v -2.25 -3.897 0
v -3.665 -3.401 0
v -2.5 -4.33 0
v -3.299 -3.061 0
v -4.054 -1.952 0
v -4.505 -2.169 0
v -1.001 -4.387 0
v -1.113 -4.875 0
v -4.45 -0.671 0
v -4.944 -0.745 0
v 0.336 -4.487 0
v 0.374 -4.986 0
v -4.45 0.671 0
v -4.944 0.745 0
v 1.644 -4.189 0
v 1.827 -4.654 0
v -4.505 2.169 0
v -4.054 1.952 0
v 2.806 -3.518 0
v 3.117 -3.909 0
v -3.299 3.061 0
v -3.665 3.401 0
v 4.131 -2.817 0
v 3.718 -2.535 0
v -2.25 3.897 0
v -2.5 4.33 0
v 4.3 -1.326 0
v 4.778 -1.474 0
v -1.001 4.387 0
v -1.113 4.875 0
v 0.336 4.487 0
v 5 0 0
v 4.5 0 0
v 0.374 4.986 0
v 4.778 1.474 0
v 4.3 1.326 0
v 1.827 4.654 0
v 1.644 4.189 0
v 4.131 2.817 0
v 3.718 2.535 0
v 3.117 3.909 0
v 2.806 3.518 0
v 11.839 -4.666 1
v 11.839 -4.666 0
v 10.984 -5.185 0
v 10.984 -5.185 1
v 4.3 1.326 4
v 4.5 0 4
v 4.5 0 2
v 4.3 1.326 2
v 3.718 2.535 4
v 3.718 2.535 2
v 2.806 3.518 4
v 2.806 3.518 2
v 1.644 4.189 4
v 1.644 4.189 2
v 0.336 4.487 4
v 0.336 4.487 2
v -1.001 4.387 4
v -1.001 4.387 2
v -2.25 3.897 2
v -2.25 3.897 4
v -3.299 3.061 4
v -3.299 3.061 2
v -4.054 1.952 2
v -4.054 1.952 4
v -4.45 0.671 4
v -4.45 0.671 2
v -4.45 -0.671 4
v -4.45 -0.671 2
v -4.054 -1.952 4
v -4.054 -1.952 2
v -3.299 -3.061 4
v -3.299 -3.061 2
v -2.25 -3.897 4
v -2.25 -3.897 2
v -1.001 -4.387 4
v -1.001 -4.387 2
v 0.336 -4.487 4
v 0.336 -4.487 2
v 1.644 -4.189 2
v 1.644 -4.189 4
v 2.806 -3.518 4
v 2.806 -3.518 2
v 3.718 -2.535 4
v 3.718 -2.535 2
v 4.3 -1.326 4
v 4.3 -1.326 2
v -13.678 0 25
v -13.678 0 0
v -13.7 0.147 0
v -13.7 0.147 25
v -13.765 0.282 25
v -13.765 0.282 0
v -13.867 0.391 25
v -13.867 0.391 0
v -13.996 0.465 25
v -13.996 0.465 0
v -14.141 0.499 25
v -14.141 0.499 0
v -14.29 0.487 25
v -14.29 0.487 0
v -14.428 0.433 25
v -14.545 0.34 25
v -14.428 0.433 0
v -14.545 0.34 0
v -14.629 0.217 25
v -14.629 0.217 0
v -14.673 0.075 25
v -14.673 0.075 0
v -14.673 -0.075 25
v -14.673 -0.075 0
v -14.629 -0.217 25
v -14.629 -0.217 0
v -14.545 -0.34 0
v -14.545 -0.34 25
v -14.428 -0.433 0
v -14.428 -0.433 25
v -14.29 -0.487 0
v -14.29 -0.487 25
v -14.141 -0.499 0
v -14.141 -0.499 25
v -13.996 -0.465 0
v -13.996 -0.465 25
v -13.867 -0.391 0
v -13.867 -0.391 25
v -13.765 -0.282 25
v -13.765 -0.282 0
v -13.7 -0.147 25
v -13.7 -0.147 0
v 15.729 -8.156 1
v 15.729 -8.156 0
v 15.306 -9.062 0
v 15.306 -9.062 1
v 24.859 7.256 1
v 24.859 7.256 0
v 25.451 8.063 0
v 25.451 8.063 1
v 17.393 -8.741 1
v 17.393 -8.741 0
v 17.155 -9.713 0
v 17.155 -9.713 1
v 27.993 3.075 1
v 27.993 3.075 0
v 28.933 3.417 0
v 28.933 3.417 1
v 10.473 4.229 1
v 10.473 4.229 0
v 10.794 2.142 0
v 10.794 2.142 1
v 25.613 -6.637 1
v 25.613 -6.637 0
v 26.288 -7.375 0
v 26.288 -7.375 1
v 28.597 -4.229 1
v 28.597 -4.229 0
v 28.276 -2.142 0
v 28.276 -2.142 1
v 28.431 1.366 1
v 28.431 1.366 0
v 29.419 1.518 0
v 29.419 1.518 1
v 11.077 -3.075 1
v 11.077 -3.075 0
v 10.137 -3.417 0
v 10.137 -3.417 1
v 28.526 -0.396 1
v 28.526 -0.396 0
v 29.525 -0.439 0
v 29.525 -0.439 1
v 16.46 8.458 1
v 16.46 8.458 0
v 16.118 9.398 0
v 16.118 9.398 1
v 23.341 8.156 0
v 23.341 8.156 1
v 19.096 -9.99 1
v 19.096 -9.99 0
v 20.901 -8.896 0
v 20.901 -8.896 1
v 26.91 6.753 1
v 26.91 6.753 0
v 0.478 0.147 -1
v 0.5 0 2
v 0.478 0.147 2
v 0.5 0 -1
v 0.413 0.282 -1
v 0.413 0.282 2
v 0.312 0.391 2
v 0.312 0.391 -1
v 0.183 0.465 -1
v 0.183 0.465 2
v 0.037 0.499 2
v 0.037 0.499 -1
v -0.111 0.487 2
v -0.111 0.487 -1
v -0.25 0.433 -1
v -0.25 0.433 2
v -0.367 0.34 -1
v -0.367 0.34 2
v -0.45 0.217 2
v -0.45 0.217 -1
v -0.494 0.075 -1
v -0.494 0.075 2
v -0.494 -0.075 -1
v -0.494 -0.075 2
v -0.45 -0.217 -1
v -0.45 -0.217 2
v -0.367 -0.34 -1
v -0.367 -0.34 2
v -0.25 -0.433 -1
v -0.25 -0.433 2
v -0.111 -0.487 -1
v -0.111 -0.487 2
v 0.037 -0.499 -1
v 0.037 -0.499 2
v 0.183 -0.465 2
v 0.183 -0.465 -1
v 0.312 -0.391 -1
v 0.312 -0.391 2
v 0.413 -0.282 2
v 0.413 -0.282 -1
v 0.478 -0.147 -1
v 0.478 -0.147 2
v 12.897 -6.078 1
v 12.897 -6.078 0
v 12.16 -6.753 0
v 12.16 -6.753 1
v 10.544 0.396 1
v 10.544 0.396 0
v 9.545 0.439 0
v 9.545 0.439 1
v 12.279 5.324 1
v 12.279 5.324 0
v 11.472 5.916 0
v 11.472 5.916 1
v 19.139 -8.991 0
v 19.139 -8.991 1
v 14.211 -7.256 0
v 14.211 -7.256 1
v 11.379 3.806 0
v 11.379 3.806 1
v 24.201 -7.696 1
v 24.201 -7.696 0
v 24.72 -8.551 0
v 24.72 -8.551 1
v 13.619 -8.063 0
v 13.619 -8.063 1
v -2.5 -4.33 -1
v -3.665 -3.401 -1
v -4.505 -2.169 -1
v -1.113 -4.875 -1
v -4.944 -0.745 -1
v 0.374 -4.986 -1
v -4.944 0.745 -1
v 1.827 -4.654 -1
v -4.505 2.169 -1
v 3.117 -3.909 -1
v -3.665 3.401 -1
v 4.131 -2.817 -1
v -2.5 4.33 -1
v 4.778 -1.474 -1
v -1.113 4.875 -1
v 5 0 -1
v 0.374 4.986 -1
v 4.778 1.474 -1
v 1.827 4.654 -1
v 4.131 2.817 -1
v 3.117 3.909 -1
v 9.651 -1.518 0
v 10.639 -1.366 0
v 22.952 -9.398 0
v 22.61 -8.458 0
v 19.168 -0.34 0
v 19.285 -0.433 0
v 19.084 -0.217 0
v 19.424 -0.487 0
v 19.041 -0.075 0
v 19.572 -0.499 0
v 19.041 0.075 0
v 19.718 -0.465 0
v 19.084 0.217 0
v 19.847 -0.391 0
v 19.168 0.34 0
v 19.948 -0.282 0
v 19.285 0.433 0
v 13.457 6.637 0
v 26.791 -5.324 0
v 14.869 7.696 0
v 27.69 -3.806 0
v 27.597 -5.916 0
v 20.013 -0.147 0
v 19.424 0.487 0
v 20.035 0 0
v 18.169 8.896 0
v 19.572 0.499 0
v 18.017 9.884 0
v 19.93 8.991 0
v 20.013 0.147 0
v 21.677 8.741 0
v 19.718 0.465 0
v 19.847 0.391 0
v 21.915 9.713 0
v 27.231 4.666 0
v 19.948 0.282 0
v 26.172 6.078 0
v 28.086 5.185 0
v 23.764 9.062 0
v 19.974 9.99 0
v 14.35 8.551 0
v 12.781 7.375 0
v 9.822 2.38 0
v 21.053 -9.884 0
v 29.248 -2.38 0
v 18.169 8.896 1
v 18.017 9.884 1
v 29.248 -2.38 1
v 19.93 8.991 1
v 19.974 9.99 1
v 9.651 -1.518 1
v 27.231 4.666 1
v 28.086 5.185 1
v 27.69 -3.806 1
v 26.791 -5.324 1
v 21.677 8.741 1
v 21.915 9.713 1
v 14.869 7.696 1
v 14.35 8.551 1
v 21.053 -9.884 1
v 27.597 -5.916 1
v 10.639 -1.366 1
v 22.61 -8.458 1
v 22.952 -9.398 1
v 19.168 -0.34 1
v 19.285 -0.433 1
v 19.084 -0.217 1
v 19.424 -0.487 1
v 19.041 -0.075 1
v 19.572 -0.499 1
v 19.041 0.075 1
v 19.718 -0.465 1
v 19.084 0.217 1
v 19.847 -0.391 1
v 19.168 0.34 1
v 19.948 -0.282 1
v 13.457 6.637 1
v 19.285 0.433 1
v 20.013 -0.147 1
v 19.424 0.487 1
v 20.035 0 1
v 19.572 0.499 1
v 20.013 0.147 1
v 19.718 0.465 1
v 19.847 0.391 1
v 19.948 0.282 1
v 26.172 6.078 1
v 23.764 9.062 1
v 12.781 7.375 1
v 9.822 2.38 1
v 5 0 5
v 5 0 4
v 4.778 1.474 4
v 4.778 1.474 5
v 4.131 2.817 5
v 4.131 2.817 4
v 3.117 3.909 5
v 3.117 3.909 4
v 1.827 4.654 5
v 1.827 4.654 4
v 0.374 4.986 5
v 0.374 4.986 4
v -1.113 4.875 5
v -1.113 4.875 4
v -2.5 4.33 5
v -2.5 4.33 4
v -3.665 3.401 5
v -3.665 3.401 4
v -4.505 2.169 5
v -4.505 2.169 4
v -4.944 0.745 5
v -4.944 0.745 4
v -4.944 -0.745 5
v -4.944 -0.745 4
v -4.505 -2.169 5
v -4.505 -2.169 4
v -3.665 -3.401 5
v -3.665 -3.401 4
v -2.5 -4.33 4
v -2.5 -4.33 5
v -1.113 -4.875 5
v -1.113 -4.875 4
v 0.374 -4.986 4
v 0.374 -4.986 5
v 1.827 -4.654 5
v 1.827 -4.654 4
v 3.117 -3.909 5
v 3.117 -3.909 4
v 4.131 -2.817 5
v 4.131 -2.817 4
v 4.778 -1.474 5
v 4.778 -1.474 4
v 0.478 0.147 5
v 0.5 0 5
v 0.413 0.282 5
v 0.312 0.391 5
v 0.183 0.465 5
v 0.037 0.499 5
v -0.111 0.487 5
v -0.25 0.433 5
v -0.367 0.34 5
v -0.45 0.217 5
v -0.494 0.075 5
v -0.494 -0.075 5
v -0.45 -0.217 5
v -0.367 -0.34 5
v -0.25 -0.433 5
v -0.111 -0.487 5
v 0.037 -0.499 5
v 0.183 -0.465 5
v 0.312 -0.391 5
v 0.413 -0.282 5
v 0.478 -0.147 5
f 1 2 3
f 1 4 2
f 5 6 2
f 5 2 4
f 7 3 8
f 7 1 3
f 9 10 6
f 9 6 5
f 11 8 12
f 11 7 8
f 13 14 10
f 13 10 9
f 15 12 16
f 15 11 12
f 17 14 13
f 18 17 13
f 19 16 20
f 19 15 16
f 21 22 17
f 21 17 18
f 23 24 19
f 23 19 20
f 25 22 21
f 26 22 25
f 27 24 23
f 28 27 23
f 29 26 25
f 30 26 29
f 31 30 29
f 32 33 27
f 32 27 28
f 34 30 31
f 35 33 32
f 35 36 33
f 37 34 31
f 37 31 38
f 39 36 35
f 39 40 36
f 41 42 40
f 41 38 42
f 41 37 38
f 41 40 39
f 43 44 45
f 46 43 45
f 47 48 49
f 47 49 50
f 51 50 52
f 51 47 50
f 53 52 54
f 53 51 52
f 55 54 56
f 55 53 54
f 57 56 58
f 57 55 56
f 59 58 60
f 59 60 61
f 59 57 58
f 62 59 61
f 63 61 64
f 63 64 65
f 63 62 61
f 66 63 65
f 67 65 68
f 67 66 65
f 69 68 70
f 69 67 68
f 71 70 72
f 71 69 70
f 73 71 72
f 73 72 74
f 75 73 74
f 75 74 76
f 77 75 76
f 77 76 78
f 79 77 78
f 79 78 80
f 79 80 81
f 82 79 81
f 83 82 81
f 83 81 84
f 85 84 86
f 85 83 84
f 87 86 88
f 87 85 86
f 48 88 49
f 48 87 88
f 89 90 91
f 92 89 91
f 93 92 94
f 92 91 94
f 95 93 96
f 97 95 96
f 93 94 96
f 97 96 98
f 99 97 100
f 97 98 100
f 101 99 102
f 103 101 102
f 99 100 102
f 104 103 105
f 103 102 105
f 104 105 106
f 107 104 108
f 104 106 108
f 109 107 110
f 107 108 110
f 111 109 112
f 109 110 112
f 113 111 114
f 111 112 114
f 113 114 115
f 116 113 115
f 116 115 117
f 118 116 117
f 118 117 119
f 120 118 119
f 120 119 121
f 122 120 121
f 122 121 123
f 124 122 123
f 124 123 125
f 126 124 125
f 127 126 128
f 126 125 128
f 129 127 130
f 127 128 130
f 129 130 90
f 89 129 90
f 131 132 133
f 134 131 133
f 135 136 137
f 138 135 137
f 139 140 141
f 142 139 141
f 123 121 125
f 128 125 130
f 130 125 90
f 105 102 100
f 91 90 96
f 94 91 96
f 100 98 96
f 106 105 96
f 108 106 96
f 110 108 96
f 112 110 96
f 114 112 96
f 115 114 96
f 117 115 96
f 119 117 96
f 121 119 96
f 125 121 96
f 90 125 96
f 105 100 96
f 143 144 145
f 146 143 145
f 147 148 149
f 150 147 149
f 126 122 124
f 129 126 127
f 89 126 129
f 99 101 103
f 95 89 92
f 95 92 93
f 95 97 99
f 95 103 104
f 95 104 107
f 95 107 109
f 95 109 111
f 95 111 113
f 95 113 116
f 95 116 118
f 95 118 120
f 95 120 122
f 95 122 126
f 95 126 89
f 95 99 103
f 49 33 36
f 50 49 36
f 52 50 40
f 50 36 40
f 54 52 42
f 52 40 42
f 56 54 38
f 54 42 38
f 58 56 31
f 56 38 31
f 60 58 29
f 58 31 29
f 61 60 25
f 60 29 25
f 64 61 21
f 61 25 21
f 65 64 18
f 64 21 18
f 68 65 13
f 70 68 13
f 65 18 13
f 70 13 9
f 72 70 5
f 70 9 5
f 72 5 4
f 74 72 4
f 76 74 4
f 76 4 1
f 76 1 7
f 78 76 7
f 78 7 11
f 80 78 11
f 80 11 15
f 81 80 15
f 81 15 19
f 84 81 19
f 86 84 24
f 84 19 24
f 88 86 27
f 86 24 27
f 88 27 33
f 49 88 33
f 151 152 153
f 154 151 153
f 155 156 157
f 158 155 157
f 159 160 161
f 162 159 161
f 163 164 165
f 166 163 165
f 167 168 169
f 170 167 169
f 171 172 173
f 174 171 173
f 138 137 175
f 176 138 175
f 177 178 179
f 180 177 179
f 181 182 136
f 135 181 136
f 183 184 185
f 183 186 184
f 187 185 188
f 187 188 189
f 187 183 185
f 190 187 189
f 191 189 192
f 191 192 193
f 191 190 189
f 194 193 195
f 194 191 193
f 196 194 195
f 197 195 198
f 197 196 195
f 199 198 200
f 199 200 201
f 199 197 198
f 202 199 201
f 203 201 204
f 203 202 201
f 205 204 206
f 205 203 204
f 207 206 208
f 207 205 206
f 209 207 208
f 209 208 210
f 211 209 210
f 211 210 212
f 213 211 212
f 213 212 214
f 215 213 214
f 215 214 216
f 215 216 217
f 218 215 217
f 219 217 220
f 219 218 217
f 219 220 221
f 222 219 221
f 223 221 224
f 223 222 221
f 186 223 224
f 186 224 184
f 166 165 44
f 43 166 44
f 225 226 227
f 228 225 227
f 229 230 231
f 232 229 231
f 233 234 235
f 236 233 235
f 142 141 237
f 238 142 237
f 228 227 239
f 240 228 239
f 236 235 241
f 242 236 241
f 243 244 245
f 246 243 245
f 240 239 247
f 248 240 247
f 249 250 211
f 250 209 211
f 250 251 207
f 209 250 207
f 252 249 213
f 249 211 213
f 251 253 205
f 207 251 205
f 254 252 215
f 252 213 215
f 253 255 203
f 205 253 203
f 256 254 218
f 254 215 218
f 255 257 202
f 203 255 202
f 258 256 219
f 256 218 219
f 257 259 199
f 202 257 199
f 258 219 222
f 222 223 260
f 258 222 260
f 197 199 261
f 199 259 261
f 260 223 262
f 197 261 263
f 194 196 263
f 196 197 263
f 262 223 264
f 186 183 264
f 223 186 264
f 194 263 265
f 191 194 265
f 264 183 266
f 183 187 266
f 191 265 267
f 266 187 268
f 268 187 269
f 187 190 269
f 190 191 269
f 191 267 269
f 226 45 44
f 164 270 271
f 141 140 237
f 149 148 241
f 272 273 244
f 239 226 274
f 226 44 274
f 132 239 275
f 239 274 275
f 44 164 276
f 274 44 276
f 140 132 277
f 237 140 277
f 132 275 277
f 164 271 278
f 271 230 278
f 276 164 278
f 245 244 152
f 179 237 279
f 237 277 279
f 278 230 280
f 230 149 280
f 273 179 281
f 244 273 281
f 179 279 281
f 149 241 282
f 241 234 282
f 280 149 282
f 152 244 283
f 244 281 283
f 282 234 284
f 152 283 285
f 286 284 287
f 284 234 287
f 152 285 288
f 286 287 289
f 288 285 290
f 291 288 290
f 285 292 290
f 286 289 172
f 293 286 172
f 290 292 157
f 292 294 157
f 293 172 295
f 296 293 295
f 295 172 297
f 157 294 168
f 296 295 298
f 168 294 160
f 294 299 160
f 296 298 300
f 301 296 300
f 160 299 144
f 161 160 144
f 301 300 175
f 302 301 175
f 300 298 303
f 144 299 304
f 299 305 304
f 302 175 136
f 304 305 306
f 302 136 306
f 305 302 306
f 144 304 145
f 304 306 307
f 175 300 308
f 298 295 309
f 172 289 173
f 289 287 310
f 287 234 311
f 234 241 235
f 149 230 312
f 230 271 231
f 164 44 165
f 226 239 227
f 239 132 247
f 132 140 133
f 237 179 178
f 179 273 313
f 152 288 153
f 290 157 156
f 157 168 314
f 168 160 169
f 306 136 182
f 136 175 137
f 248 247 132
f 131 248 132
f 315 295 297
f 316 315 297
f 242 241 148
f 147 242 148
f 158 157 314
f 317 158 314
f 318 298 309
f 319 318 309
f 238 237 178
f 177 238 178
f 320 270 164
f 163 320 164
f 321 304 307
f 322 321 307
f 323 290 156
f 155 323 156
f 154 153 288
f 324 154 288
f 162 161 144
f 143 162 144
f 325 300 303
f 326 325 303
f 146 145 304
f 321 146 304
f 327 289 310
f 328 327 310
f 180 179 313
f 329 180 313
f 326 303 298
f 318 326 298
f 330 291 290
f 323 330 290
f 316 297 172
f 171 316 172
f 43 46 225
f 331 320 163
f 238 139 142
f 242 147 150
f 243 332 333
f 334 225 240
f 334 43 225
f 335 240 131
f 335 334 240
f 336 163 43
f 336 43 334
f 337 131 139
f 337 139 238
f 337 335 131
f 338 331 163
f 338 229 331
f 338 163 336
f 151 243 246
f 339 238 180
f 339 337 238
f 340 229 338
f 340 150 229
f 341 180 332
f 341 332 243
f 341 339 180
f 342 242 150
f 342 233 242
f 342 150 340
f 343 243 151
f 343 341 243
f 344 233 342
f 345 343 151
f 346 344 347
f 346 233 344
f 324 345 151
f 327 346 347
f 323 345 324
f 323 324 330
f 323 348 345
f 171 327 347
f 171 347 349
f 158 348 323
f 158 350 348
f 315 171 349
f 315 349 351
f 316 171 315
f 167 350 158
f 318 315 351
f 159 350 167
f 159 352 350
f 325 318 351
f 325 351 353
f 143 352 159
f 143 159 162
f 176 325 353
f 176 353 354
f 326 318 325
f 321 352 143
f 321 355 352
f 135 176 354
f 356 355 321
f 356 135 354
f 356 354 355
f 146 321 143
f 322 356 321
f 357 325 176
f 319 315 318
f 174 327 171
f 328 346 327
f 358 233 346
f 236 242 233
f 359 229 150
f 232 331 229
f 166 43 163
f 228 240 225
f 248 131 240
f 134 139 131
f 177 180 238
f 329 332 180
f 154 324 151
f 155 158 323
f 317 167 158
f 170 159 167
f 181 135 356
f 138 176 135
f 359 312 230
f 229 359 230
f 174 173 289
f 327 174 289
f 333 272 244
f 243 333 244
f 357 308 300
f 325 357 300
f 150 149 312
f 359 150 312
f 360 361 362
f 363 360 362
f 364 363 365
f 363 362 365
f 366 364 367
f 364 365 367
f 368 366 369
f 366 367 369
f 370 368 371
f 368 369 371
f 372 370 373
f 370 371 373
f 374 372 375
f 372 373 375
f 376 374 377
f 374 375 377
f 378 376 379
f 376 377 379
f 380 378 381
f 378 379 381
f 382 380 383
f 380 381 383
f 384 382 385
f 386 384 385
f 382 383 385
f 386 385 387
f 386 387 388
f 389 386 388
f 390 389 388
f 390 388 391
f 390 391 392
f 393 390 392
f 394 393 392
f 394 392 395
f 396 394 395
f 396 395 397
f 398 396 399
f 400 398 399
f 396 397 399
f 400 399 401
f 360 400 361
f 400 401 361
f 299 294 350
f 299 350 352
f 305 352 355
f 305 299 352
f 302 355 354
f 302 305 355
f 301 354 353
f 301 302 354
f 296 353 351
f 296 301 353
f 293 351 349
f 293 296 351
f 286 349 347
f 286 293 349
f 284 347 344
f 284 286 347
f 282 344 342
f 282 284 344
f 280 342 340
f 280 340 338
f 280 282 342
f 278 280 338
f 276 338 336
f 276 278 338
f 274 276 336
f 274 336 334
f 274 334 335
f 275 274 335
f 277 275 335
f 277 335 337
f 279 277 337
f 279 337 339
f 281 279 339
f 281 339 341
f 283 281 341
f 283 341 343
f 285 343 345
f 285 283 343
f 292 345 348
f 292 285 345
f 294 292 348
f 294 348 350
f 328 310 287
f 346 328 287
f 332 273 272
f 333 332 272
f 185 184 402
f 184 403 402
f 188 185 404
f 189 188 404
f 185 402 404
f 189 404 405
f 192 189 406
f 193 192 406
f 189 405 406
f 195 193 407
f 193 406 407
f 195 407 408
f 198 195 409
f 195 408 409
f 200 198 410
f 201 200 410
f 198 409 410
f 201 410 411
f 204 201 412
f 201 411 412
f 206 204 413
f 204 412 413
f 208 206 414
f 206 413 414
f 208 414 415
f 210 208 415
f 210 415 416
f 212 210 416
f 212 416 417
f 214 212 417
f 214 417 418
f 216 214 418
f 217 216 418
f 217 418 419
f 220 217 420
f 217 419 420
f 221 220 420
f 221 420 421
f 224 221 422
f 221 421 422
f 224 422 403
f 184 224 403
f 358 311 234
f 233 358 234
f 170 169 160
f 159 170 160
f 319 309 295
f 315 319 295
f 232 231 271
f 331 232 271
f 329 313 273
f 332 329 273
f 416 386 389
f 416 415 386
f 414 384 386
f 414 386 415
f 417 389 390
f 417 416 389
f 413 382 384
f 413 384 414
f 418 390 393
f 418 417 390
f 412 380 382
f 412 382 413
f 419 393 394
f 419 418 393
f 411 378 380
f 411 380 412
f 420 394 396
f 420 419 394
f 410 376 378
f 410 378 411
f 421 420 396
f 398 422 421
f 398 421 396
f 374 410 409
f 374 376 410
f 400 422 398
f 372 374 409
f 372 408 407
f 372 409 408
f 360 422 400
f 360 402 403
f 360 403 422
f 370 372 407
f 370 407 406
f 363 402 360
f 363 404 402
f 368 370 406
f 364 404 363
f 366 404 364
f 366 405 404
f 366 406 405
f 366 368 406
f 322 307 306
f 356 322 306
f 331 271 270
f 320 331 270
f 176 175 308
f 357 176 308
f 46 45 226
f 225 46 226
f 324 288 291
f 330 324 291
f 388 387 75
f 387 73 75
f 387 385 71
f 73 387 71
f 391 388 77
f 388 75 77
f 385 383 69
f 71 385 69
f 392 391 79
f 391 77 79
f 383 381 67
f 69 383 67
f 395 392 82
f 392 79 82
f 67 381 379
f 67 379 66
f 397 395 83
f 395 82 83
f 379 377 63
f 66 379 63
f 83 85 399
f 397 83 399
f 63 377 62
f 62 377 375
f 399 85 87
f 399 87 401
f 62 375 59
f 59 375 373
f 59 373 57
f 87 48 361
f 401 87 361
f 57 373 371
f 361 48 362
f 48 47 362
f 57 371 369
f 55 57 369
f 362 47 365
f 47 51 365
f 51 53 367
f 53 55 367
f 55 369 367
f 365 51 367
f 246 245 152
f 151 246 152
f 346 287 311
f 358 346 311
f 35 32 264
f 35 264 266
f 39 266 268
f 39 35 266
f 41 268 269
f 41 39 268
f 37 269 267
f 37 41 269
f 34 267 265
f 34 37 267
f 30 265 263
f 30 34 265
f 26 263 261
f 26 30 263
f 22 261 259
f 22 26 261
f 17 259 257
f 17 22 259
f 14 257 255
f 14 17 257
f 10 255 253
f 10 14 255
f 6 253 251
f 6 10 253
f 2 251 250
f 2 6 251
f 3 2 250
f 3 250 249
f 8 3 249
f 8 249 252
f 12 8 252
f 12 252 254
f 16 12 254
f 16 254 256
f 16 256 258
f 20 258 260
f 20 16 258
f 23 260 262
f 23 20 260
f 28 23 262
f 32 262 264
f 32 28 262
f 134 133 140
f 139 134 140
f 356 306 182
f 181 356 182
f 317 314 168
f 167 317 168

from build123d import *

# Parameters (mm, degrees)
F0_R     = 5
F0_R_2   = 4.5
F0_R_3   = 0.5
F1_DEPTH = 1
F2_DEPTH = 2
F4_R     = 0.5
F5_DEPTH = 1
F6_DEPTH = 25


with BuildPart() as f1:
    # F0 (on Top) → F1 (new body)
    with BuildSketch(Plane.XY):
        Circle(F0_R)
        Circle(F0_R_2, mode=Mode.SUBTRACT)
        Circle(F0_R_2)
        Circle(F0_R_3, mode=Mode.SUBTRACT)
    extrude(amount=-F1_DEPTH)

    # F0 (on Top) → F2 (join)
    with BuildSketch(Plane.XY):
        Circle(F0_R_2)
        Circle(F0_R_3, mode=Mode.SUBTRACT)
    extrude(amount=F2_DEPTH)

    # F3: F1 across face


with BuildPart() as f1_1:
    add(f1.part)
    add(f1.part.mirror(Plane.XY.offset(2)))


with BuildPart() as f5:
    # F4 (on Top) → F5 (new body)
    with BuildSketch(Plane.XY):
        Polygon((23.764091, 9.0617), (21.676977, 8.741381), (21.914979, 9.712645), (19.93046, 8.991306), (19.974405, 9.99034), (18.168744, 8.895699), (18.016942, 9.88411), (16.45953, 8.458236), (16.117816, 9.39804), (14.868503, 7.695728), (14.350009, 8.550809), (13.456806, 6.637477), (12.781456, 7.374975), (12.278688, 5.324152), (11.472436, 5.915725), (11.379425, 3.806223), (10.473255, 4.229136), (10.793574, 2.142022), (9.822309, 2.380025), (10.543649, 0.395505), (9.544615, 0.43945), (10.639255, -1.366211), (9.650844, -1.518012), (11.076718, -3.075425), (10.136914, -3.417139), (11.839227, -4.666451), (10.984146, -5.184946), (12.897477, -6.078149), (12.15998, -6.753499), (14.210803, -7.256267), (13.61923, -8.062518), (15.728732, -8.15553), (15.305819, -9.0617), (17.392933, -8.741381), (17.15493, -9.712645), (19.13945, -8.991306), (19.095505, -9.99034), (20.901166, -8.895699), (21.052967, -9.88411), (22.610379, -8.458236), (22.952093, -9.39804), (24.201406, -7.695728), (24.719901, -8.550809), (25.613104, -6.637477), (26.288454, -7.374975), (26.791221, -5.324152), (27.597473, -5.915725), (27.690485, -3.806223), (28.596655, -4.229136), (28.276336, -2.142022), (29.2476, -2.380025), (28.52626, -0.395505), (29.525294, -0.43945), (28.430654, 1.366211), (29.419065, 1.518012), (27.993191, 3.075425), (28.932995, 3.417139), (27.230683, 4.666451), (28.085764, 5.184946), (26.172432, 6.078149), (26.90993, 6.753499), (24.859107, 7.256267), (25.450679, 8.062518), (23.341177, 8.15553), align=None)
        with Locations((19.534955, 0)):
            Circle(F4_R, mode=Mode.SUBTRACT)
    extrude(amount=F5_DEPTH)


with BuildPart() as f6:
    # F4 (on Top) → F6 (new body)
    with BuildSketch(Plane.XY):
        with Locations((-14.178284, 0)):
            Circle(F4_R)
    extrude(amount=F6_DEPTH)


solid = Compound([f1_1.part, f5.part, f6.part])
